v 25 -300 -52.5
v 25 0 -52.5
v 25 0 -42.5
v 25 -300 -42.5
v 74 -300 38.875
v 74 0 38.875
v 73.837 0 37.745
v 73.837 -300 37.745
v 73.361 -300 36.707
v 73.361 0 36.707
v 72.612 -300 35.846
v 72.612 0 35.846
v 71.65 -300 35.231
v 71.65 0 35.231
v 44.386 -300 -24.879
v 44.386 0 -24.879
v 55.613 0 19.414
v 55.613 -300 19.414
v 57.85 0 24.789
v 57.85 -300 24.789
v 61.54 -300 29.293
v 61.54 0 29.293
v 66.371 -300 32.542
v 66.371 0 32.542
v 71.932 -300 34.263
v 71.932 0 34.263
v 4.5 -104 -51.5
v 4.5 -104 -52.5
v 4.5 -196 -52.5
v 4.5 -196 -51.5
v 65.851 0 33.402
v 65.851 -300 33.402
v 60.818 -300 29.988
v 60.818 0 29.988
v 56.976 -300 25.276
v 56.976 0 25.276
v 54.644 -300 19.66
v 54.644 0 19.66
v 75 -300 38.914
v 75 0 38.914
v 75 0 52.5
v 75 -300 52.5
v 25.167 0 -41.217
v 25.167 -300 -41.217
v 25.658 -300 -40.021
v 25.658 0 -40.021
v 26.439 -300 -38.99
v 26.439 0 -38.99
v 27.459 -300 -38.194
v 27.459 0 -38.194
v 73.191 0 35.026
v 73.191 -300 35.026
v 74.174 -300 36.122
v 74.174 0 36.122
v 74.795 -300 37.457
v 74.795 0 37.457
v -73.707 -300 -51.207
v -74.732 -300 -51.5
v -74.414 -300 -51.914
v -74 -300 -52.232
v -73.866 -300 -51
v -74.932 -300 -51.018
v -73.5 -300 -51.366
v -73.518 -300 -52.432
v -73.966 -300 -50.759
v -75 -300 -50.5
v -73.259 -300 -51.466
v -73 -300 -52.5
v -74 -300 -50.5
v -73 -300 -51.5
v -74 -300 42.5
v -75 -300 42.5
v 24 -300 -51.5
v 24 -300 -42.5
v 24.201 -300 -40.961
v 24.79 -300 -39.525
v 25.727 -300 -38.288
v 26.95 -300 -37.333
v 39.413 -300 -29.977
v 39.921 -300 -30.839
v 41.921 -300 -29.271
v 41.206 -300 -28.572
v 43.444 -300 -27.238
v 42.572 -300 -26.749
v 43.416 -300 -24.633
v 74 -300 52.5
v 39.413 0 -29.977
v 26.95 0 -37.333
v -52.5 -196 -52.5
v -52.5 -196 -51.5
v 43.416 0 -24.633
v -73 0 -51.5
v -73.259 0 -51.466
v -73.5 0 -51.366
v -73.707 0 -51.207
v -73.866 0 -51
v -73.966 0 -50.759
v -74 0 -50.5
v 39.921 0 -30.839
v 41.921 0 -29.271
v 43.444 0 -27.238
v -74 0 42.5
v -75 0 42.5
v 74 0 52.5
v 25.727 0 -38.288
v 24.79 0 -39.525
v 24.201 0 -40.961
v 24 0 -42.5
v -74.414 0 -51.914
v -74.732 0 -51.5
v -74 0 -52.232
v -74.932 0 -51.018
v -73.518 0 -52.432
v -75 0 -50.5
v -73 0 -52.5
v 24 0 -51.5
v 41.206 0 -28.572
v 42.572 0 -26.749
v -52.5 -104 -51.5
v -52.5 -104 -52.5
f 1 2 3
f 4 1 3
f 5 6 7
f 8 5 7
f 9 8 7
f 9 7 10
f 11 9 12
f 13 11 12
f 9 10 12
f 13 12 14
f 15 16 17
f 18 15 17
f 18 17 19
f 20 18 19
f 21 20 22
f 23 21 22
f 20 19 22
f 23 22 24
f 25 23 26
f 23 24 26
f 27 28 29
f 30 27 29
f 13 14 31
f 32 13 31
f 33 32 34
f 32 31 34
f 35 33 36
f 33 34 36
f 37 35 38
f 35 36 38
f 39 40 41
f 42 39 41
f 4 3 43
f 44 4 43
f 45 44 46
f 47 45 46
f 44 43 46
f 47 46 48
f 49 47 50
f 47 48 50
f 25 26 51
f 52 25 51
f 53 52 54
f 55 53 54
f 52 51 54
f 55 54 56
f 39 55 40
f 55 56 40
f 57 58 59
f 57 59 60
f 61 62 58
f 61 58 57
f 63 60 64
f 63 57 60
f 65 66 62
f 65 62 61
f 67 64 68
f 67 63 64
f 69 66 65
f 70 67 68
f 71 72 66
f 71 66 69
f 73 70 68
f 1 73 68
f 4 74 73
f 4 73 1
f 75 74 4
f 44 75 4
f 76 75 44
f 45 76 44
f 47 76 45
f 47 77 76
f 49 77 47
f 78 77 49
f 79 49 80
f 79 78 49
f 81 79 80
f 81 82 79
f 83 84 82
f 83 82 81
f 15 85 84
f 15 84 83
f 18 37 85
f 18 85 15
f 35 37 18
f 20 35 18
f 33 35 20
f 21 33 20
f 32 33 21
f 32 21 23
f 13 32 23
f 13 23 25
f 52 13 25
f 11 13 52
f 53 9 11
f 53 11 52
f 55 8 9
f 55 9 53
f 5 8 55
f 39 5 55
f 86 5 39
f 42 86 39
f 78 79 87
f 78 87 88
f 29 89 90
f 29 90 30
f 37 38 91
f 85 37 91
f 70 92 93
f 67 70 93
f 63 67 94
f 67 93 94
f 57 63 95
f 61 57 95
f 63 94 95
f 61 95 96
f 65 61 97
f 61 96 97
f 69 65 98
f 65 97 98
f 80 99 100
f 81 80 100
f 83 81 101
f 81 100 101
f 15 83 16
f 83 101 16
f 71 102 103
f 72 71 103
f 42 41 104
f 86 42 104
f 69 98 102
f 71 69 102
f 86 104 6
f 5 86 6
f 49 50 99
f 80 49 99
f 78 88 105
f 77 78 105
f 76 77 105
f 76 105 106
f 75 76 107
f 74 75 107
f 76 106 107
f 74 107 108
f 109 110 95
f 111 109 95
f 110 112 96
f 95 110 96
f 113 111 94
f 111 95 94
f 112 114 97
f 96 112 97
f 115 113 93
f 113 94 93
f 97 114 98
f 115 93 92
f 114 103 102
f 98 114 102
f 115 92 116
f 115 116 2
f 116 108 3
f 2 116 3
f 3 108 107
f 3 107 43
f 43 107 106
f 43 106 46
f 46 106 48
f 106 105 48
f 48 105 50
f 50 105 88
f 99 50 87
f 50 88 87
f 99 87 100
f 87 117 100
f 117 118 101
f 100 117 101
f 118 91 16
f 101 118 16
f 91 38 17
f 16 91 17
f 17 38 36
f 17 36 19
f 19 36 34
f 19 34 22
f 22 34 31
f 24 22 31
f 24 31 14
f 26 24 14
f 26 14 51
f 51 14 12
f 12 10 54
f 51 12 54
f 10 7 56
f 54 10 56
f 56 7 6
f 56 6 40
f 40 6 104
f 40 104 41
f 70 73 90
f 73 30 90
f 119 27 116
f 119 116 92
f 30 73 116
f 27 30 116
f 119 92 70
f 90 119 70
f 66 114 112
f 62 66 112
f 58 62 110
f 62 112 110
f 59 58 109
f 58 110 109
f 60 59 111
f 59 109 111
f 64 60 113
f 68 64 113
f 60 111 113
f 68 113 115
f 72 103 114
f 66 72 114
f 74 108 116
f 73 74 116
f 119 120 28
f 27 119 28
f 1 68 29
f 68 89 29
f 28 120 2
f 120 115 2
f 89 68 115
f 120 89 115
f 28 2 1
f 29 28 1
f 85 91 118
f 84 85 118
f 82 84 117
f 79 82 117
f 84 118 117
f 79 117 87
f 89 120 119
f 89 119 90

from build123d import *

# Parameters (mm, degrees)
F1_DEPTH = 300
F2_W     = 57
F2_H     = 92
F3_DEPTH = 25
F4_DEPTH = 25
F5_DEPTH = 25


with BuildPart() as f1:
    # F0 (on Front) → F1 (new body)
    with BuildSketch(Plane.XZ):
        with BuildLine():
            Line((75, 38.914216), (75, 52.5))
            Line((75, 52.5), (74, 52.5))
            Line((74, 52.5), (74, 38.875))
            ThreePointArc((74, 38.875), (73.361451, 36.706903), (71.649678, 35.231024))
            ThreePointArc((71.649678, 35.231024), (60.8185, 29.988223), (54.643786, 19.659898))
            Line((54.643786, 19.659898), (43.416317, -24.63337))
            ThreePointArc((43.416317, -24.63337), (41.948954, -27.705545), (39.413109, -29.977308))
            Line((39.413109, -29.977308), (26.950339, -37.332837))
            ThreePointArc((26.950339, -37.332837), (24.789532, -39.524934), (24, -42.5))
            Line((24, -42.5), (24, -51.5))
            Line((24, -51.5), (-73, -51.5))
            ThreePointArc((-73, -51.5), (-73.707107, -51.207107), (-74, -50.5))
            Line((-74, -50.5), (-74, 42.5))
            Line((-74, 42.5), (-75, 42.5))
            Line((-75, 42.5), (-75, -50.5))
            ThreePointArc((-75, -50.5), (-74.414214, -51.914214), (-73, -52.5))
            Line((-73, -52.5), (25, -52.5))
            Line((25, -52.5), (25, -42.5))
            ThreePointArc((25, -42.5), (25.657943, -40.020778), (27.458616, -38.194031))
            Line((27.458616, -38.194031), (39.921386, -30.838502))
            ThreePointArc((39.921386, -30.838502), (42.749295, -28.305091), (44.385661, -24.87908))
            Line((44.385661, -24.87908), (55.613129, 19.414189))
            ThreePointArc((55.613129, 19.414189), (61.539869, 29.29273), (71.932405, 34.263346))
            ThreePointArc((71.932405, 34.263346), (74.173992, 36.121942), (75, 38.914216))
        make_face()
    extrude(amount=F1_DEPTH)

    # F2 (on face) → F3 (cut)
    with BuildSketch(Plane(origin=(0, 0, -52.5), x_dir=(1, 0, 0), z_dir=(0, 0, -1))):
        with Locations((-24, 150)):
            Rectangle(F2_W, F2_H)
    extrude(amount=-F3_DEPTH, mode=Mode.SUBTRACT)

    # F2 (on face) → F4 (cut)
    with BuildSketch(Plane(origin=(0, 0, -52.5), x_dir=(1, 0, 0), z_dir=(0, 0, -1))):
        with Locations((-24, 150)):
            Rectangle(F2_W, F2_H)
    extrude(amount=-F4_DEPTH, mode=Mode.SUBTRACT)

    # F2 (on face) → F5 (cut)
    with BuildSketch(Plane(origin=(0, 0, -52.5), x_dir=(1, 0, 0), z_dir=(0, 0, -1))):
        with Locations((-24, 150)):
            Rectangle(F2_W, F2_H)
    extrude(amount=-F5_DEPTH, mode=Mode.SUBTRACT)


solid = f1.part
